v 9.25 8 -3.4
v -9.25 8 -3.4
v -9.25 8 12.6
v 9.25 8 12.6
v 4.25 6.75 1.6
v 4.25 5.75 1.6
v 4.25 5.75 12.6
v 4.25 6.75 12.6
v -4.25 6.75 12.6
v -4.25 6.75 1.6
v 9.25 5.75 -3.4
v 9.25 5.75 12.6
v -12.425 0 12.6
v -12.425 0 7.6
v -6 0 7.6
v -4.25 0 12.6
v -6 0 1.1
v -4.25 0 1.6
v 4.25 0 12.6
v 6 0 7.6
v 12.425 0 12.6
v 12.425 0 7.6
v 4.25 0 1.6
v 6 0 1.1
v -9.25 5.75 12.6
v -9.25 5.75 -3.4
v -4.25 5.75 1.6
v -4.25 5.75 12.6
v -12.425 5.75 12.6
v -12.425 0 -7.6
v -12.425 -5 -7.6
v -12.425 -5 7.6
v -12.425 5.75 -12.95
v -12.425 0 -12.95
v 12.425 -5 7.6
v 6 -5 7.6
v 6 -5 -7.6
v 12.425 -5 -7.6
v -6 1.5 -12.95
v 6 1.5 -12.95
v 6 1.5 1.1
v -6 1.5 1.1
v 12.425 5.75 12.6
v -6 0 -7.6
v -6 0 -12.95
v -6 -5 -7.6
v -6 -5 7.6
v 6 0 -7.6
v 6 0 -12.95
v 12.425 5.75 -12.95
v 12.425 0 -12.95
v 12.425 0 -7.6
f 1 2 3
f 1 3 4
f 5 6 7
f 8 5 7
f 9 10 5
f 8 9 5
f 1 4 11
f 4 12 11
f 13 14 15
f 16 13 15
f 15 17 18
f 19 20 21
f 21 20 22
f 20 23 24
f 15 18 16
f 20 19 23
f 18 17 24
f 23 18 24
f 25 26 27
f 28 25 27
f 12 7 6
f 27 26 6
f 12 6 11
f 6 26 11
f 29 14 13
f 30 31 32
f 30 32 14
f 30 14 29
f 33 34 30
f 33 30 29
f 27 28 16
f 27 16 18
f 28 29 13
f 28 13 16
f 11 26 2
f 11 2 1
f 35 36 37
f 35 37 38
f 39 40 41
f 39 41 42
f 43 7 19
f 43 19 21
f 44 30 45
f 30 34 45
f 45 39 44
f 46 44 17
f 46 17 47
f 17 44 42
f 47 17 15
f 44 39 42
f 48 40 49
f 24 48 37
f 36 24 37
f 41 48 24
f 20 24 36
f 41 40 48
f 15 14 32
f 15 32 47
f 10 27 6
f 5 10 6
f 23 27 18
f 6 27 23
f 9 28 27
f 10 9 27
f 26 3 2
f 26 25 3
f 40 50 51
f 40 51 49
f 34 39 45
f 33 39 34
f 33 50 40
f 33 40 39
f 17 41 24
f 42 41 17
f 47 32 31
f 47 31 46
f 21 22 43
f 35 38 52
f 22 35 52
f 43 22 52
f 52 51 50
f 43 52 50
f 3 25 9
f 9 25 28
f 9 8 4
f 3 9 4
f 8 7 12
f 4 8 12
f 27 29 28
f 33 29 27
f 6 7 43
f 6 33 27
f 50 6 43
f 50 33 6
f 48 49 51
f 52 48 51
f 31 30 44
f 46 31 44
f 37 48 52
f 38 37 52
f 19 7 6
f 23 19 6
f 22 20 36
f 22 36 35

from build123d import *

# Parameters (mm, degrees)
SKETCH1_W           = 24.85
SKETCH1_H           = 15.2
BOSS_EXTRUDE1_DEPTH = 5.75
SKETCH2_W           = 6.425
SKETCH2_H           = 15.2
BOSS_EXTRUDE2_DEPTH = 5
SKETCH3_W           = 24.85
SKETCH3_H           = 5.75
BOSS_EXTRUDE3_DEPTH = 5.35
SKETCH5_W           = 24.85
SKETCH5_H           = 5.75
BOSS_EXTRUDE4_DEPTH = 5
SKETCH6_W           = 8.5
SKETCH6_H           = 11
CUT_EXTRUDE2_DEPTH  = 5.75
SKETCH4_W           = 12
SKETCH4_H           = 1.5
CUT_EXTRUDE1_DEPTH  = 14.05
BOSS_EXTRUDE5_DEPTH = 1
SKETCH8_W           = 18.5
SKETCH8_H           = 16
BOSS_EXTRUDE6_DEPTH = 1.25


with BuildPart() as part:
    # Sketch1 → Boss-Extrude1 (new body)
    with BuildSketch(Plane(origin=(0, 0, 0), x_dir=(1, 0, 0), z_dir=(0, 1, 0))):
        Rectangle(SKETCH1_W, SKETCH1_H)
    extrude(amount=BOSS_EXTRUDE1_DEPTH)

    # Sketch2 → Boss-Extrude2 (add)
    with BuildSketch(Plane.XZ):
        with Locations((-9.2125, 0)):
            Rectangle(SKETCH2_W, SKETCH2_H)
        with Locations((9.2125, 0)):
            Rectangle(SKETCH2_W, SKETCH2_H)
    extrude(amount=BOSS_EXTRUDE2_DEPTH)

    # Sketch3 → Boss-Extrude3 (add)
    with BuildSketch(Plane(origin=(0, 0, -7.6), x_dir=(-1, 0, 0), z_dir=(0, 0, -1))):
        with Locations((0, 2.875)):
            Rectangle(SKETCH3_W, SKETCH3_H)
    extrude(amount=BOSS_EXTRUDE3_DEPTH)

    # Sketch5 → Boss-Extrude4 (add)
    with BuildSketch(Plane.XY.offset(7.6)):
        with Locations((0, 2.875)):
            Rectangle(SKETCH5_W, SKETCH5_H)
    extrude(amount=BOSS_EXTRUDE4_DEPTH)

    # Sketch6 → Cut-Extrude2 (cut)
    with BuildSketch(Plane(origin=(0, 5.75, 0), x_dir=(1, 0, 0), z_dir=(0, 1, 0))):
        with Locations((0, -7.1)):
            Rectangle(SKETCH6_W, SKETCH6_H)
    extrude(amount=-CUT_EXTRUDE2_DEPTH, mode=Mode.SUBTRACT)

    # Sketch4 → Cut-Extrude1 (cut)
    with BuildSketch(Plane(origin=(0, 0, -12.95), x_dir=(-1, 0, 0), z_dir=(0, 0, -1))):
        with Locations((0, 0.75)):
            Rectangle(SKETCH4_W, SKETCH4_H)
    extrude(amount=-CUT_EXTRUDE1_DEPTH, mode=Mode.SUBTRACT)


with BuildPart() as body_2:
    # Sketch7 → Boss-Extrude5 (new body)
    with BuildSketch(Plane(origin=(0, 5.75, 0), x_dir=(1, 0, 0), z_dir=(0, 1, 0))):
        Polygon((9.25, 3.4), (-9.25, 3.4), (-9.25, -12.6), (-4.25, -12.6), (-4.25, -1.6), (4.25, -1.6), (4.25, -12.6), (9.25, -12.6), align=None)
    extrude(amount=BOSS_EXTRUDE5_DEPTH)

    # Sketch8 → Boss-Extrude6 (add)
    with BuildSketch(Plane(origin=(0, 6.75, 0), x_dir=(1, 0, 0), z_dir=(0, 1, 0))):
        with Locations((0, -4.6)):
            Rectangle(SKETCH8_W, SKETCH8_H)
    extrude(amount=BOSS_EXTRUDE6_DEPTH)


solid = Compound([part.part, body_2.part])
